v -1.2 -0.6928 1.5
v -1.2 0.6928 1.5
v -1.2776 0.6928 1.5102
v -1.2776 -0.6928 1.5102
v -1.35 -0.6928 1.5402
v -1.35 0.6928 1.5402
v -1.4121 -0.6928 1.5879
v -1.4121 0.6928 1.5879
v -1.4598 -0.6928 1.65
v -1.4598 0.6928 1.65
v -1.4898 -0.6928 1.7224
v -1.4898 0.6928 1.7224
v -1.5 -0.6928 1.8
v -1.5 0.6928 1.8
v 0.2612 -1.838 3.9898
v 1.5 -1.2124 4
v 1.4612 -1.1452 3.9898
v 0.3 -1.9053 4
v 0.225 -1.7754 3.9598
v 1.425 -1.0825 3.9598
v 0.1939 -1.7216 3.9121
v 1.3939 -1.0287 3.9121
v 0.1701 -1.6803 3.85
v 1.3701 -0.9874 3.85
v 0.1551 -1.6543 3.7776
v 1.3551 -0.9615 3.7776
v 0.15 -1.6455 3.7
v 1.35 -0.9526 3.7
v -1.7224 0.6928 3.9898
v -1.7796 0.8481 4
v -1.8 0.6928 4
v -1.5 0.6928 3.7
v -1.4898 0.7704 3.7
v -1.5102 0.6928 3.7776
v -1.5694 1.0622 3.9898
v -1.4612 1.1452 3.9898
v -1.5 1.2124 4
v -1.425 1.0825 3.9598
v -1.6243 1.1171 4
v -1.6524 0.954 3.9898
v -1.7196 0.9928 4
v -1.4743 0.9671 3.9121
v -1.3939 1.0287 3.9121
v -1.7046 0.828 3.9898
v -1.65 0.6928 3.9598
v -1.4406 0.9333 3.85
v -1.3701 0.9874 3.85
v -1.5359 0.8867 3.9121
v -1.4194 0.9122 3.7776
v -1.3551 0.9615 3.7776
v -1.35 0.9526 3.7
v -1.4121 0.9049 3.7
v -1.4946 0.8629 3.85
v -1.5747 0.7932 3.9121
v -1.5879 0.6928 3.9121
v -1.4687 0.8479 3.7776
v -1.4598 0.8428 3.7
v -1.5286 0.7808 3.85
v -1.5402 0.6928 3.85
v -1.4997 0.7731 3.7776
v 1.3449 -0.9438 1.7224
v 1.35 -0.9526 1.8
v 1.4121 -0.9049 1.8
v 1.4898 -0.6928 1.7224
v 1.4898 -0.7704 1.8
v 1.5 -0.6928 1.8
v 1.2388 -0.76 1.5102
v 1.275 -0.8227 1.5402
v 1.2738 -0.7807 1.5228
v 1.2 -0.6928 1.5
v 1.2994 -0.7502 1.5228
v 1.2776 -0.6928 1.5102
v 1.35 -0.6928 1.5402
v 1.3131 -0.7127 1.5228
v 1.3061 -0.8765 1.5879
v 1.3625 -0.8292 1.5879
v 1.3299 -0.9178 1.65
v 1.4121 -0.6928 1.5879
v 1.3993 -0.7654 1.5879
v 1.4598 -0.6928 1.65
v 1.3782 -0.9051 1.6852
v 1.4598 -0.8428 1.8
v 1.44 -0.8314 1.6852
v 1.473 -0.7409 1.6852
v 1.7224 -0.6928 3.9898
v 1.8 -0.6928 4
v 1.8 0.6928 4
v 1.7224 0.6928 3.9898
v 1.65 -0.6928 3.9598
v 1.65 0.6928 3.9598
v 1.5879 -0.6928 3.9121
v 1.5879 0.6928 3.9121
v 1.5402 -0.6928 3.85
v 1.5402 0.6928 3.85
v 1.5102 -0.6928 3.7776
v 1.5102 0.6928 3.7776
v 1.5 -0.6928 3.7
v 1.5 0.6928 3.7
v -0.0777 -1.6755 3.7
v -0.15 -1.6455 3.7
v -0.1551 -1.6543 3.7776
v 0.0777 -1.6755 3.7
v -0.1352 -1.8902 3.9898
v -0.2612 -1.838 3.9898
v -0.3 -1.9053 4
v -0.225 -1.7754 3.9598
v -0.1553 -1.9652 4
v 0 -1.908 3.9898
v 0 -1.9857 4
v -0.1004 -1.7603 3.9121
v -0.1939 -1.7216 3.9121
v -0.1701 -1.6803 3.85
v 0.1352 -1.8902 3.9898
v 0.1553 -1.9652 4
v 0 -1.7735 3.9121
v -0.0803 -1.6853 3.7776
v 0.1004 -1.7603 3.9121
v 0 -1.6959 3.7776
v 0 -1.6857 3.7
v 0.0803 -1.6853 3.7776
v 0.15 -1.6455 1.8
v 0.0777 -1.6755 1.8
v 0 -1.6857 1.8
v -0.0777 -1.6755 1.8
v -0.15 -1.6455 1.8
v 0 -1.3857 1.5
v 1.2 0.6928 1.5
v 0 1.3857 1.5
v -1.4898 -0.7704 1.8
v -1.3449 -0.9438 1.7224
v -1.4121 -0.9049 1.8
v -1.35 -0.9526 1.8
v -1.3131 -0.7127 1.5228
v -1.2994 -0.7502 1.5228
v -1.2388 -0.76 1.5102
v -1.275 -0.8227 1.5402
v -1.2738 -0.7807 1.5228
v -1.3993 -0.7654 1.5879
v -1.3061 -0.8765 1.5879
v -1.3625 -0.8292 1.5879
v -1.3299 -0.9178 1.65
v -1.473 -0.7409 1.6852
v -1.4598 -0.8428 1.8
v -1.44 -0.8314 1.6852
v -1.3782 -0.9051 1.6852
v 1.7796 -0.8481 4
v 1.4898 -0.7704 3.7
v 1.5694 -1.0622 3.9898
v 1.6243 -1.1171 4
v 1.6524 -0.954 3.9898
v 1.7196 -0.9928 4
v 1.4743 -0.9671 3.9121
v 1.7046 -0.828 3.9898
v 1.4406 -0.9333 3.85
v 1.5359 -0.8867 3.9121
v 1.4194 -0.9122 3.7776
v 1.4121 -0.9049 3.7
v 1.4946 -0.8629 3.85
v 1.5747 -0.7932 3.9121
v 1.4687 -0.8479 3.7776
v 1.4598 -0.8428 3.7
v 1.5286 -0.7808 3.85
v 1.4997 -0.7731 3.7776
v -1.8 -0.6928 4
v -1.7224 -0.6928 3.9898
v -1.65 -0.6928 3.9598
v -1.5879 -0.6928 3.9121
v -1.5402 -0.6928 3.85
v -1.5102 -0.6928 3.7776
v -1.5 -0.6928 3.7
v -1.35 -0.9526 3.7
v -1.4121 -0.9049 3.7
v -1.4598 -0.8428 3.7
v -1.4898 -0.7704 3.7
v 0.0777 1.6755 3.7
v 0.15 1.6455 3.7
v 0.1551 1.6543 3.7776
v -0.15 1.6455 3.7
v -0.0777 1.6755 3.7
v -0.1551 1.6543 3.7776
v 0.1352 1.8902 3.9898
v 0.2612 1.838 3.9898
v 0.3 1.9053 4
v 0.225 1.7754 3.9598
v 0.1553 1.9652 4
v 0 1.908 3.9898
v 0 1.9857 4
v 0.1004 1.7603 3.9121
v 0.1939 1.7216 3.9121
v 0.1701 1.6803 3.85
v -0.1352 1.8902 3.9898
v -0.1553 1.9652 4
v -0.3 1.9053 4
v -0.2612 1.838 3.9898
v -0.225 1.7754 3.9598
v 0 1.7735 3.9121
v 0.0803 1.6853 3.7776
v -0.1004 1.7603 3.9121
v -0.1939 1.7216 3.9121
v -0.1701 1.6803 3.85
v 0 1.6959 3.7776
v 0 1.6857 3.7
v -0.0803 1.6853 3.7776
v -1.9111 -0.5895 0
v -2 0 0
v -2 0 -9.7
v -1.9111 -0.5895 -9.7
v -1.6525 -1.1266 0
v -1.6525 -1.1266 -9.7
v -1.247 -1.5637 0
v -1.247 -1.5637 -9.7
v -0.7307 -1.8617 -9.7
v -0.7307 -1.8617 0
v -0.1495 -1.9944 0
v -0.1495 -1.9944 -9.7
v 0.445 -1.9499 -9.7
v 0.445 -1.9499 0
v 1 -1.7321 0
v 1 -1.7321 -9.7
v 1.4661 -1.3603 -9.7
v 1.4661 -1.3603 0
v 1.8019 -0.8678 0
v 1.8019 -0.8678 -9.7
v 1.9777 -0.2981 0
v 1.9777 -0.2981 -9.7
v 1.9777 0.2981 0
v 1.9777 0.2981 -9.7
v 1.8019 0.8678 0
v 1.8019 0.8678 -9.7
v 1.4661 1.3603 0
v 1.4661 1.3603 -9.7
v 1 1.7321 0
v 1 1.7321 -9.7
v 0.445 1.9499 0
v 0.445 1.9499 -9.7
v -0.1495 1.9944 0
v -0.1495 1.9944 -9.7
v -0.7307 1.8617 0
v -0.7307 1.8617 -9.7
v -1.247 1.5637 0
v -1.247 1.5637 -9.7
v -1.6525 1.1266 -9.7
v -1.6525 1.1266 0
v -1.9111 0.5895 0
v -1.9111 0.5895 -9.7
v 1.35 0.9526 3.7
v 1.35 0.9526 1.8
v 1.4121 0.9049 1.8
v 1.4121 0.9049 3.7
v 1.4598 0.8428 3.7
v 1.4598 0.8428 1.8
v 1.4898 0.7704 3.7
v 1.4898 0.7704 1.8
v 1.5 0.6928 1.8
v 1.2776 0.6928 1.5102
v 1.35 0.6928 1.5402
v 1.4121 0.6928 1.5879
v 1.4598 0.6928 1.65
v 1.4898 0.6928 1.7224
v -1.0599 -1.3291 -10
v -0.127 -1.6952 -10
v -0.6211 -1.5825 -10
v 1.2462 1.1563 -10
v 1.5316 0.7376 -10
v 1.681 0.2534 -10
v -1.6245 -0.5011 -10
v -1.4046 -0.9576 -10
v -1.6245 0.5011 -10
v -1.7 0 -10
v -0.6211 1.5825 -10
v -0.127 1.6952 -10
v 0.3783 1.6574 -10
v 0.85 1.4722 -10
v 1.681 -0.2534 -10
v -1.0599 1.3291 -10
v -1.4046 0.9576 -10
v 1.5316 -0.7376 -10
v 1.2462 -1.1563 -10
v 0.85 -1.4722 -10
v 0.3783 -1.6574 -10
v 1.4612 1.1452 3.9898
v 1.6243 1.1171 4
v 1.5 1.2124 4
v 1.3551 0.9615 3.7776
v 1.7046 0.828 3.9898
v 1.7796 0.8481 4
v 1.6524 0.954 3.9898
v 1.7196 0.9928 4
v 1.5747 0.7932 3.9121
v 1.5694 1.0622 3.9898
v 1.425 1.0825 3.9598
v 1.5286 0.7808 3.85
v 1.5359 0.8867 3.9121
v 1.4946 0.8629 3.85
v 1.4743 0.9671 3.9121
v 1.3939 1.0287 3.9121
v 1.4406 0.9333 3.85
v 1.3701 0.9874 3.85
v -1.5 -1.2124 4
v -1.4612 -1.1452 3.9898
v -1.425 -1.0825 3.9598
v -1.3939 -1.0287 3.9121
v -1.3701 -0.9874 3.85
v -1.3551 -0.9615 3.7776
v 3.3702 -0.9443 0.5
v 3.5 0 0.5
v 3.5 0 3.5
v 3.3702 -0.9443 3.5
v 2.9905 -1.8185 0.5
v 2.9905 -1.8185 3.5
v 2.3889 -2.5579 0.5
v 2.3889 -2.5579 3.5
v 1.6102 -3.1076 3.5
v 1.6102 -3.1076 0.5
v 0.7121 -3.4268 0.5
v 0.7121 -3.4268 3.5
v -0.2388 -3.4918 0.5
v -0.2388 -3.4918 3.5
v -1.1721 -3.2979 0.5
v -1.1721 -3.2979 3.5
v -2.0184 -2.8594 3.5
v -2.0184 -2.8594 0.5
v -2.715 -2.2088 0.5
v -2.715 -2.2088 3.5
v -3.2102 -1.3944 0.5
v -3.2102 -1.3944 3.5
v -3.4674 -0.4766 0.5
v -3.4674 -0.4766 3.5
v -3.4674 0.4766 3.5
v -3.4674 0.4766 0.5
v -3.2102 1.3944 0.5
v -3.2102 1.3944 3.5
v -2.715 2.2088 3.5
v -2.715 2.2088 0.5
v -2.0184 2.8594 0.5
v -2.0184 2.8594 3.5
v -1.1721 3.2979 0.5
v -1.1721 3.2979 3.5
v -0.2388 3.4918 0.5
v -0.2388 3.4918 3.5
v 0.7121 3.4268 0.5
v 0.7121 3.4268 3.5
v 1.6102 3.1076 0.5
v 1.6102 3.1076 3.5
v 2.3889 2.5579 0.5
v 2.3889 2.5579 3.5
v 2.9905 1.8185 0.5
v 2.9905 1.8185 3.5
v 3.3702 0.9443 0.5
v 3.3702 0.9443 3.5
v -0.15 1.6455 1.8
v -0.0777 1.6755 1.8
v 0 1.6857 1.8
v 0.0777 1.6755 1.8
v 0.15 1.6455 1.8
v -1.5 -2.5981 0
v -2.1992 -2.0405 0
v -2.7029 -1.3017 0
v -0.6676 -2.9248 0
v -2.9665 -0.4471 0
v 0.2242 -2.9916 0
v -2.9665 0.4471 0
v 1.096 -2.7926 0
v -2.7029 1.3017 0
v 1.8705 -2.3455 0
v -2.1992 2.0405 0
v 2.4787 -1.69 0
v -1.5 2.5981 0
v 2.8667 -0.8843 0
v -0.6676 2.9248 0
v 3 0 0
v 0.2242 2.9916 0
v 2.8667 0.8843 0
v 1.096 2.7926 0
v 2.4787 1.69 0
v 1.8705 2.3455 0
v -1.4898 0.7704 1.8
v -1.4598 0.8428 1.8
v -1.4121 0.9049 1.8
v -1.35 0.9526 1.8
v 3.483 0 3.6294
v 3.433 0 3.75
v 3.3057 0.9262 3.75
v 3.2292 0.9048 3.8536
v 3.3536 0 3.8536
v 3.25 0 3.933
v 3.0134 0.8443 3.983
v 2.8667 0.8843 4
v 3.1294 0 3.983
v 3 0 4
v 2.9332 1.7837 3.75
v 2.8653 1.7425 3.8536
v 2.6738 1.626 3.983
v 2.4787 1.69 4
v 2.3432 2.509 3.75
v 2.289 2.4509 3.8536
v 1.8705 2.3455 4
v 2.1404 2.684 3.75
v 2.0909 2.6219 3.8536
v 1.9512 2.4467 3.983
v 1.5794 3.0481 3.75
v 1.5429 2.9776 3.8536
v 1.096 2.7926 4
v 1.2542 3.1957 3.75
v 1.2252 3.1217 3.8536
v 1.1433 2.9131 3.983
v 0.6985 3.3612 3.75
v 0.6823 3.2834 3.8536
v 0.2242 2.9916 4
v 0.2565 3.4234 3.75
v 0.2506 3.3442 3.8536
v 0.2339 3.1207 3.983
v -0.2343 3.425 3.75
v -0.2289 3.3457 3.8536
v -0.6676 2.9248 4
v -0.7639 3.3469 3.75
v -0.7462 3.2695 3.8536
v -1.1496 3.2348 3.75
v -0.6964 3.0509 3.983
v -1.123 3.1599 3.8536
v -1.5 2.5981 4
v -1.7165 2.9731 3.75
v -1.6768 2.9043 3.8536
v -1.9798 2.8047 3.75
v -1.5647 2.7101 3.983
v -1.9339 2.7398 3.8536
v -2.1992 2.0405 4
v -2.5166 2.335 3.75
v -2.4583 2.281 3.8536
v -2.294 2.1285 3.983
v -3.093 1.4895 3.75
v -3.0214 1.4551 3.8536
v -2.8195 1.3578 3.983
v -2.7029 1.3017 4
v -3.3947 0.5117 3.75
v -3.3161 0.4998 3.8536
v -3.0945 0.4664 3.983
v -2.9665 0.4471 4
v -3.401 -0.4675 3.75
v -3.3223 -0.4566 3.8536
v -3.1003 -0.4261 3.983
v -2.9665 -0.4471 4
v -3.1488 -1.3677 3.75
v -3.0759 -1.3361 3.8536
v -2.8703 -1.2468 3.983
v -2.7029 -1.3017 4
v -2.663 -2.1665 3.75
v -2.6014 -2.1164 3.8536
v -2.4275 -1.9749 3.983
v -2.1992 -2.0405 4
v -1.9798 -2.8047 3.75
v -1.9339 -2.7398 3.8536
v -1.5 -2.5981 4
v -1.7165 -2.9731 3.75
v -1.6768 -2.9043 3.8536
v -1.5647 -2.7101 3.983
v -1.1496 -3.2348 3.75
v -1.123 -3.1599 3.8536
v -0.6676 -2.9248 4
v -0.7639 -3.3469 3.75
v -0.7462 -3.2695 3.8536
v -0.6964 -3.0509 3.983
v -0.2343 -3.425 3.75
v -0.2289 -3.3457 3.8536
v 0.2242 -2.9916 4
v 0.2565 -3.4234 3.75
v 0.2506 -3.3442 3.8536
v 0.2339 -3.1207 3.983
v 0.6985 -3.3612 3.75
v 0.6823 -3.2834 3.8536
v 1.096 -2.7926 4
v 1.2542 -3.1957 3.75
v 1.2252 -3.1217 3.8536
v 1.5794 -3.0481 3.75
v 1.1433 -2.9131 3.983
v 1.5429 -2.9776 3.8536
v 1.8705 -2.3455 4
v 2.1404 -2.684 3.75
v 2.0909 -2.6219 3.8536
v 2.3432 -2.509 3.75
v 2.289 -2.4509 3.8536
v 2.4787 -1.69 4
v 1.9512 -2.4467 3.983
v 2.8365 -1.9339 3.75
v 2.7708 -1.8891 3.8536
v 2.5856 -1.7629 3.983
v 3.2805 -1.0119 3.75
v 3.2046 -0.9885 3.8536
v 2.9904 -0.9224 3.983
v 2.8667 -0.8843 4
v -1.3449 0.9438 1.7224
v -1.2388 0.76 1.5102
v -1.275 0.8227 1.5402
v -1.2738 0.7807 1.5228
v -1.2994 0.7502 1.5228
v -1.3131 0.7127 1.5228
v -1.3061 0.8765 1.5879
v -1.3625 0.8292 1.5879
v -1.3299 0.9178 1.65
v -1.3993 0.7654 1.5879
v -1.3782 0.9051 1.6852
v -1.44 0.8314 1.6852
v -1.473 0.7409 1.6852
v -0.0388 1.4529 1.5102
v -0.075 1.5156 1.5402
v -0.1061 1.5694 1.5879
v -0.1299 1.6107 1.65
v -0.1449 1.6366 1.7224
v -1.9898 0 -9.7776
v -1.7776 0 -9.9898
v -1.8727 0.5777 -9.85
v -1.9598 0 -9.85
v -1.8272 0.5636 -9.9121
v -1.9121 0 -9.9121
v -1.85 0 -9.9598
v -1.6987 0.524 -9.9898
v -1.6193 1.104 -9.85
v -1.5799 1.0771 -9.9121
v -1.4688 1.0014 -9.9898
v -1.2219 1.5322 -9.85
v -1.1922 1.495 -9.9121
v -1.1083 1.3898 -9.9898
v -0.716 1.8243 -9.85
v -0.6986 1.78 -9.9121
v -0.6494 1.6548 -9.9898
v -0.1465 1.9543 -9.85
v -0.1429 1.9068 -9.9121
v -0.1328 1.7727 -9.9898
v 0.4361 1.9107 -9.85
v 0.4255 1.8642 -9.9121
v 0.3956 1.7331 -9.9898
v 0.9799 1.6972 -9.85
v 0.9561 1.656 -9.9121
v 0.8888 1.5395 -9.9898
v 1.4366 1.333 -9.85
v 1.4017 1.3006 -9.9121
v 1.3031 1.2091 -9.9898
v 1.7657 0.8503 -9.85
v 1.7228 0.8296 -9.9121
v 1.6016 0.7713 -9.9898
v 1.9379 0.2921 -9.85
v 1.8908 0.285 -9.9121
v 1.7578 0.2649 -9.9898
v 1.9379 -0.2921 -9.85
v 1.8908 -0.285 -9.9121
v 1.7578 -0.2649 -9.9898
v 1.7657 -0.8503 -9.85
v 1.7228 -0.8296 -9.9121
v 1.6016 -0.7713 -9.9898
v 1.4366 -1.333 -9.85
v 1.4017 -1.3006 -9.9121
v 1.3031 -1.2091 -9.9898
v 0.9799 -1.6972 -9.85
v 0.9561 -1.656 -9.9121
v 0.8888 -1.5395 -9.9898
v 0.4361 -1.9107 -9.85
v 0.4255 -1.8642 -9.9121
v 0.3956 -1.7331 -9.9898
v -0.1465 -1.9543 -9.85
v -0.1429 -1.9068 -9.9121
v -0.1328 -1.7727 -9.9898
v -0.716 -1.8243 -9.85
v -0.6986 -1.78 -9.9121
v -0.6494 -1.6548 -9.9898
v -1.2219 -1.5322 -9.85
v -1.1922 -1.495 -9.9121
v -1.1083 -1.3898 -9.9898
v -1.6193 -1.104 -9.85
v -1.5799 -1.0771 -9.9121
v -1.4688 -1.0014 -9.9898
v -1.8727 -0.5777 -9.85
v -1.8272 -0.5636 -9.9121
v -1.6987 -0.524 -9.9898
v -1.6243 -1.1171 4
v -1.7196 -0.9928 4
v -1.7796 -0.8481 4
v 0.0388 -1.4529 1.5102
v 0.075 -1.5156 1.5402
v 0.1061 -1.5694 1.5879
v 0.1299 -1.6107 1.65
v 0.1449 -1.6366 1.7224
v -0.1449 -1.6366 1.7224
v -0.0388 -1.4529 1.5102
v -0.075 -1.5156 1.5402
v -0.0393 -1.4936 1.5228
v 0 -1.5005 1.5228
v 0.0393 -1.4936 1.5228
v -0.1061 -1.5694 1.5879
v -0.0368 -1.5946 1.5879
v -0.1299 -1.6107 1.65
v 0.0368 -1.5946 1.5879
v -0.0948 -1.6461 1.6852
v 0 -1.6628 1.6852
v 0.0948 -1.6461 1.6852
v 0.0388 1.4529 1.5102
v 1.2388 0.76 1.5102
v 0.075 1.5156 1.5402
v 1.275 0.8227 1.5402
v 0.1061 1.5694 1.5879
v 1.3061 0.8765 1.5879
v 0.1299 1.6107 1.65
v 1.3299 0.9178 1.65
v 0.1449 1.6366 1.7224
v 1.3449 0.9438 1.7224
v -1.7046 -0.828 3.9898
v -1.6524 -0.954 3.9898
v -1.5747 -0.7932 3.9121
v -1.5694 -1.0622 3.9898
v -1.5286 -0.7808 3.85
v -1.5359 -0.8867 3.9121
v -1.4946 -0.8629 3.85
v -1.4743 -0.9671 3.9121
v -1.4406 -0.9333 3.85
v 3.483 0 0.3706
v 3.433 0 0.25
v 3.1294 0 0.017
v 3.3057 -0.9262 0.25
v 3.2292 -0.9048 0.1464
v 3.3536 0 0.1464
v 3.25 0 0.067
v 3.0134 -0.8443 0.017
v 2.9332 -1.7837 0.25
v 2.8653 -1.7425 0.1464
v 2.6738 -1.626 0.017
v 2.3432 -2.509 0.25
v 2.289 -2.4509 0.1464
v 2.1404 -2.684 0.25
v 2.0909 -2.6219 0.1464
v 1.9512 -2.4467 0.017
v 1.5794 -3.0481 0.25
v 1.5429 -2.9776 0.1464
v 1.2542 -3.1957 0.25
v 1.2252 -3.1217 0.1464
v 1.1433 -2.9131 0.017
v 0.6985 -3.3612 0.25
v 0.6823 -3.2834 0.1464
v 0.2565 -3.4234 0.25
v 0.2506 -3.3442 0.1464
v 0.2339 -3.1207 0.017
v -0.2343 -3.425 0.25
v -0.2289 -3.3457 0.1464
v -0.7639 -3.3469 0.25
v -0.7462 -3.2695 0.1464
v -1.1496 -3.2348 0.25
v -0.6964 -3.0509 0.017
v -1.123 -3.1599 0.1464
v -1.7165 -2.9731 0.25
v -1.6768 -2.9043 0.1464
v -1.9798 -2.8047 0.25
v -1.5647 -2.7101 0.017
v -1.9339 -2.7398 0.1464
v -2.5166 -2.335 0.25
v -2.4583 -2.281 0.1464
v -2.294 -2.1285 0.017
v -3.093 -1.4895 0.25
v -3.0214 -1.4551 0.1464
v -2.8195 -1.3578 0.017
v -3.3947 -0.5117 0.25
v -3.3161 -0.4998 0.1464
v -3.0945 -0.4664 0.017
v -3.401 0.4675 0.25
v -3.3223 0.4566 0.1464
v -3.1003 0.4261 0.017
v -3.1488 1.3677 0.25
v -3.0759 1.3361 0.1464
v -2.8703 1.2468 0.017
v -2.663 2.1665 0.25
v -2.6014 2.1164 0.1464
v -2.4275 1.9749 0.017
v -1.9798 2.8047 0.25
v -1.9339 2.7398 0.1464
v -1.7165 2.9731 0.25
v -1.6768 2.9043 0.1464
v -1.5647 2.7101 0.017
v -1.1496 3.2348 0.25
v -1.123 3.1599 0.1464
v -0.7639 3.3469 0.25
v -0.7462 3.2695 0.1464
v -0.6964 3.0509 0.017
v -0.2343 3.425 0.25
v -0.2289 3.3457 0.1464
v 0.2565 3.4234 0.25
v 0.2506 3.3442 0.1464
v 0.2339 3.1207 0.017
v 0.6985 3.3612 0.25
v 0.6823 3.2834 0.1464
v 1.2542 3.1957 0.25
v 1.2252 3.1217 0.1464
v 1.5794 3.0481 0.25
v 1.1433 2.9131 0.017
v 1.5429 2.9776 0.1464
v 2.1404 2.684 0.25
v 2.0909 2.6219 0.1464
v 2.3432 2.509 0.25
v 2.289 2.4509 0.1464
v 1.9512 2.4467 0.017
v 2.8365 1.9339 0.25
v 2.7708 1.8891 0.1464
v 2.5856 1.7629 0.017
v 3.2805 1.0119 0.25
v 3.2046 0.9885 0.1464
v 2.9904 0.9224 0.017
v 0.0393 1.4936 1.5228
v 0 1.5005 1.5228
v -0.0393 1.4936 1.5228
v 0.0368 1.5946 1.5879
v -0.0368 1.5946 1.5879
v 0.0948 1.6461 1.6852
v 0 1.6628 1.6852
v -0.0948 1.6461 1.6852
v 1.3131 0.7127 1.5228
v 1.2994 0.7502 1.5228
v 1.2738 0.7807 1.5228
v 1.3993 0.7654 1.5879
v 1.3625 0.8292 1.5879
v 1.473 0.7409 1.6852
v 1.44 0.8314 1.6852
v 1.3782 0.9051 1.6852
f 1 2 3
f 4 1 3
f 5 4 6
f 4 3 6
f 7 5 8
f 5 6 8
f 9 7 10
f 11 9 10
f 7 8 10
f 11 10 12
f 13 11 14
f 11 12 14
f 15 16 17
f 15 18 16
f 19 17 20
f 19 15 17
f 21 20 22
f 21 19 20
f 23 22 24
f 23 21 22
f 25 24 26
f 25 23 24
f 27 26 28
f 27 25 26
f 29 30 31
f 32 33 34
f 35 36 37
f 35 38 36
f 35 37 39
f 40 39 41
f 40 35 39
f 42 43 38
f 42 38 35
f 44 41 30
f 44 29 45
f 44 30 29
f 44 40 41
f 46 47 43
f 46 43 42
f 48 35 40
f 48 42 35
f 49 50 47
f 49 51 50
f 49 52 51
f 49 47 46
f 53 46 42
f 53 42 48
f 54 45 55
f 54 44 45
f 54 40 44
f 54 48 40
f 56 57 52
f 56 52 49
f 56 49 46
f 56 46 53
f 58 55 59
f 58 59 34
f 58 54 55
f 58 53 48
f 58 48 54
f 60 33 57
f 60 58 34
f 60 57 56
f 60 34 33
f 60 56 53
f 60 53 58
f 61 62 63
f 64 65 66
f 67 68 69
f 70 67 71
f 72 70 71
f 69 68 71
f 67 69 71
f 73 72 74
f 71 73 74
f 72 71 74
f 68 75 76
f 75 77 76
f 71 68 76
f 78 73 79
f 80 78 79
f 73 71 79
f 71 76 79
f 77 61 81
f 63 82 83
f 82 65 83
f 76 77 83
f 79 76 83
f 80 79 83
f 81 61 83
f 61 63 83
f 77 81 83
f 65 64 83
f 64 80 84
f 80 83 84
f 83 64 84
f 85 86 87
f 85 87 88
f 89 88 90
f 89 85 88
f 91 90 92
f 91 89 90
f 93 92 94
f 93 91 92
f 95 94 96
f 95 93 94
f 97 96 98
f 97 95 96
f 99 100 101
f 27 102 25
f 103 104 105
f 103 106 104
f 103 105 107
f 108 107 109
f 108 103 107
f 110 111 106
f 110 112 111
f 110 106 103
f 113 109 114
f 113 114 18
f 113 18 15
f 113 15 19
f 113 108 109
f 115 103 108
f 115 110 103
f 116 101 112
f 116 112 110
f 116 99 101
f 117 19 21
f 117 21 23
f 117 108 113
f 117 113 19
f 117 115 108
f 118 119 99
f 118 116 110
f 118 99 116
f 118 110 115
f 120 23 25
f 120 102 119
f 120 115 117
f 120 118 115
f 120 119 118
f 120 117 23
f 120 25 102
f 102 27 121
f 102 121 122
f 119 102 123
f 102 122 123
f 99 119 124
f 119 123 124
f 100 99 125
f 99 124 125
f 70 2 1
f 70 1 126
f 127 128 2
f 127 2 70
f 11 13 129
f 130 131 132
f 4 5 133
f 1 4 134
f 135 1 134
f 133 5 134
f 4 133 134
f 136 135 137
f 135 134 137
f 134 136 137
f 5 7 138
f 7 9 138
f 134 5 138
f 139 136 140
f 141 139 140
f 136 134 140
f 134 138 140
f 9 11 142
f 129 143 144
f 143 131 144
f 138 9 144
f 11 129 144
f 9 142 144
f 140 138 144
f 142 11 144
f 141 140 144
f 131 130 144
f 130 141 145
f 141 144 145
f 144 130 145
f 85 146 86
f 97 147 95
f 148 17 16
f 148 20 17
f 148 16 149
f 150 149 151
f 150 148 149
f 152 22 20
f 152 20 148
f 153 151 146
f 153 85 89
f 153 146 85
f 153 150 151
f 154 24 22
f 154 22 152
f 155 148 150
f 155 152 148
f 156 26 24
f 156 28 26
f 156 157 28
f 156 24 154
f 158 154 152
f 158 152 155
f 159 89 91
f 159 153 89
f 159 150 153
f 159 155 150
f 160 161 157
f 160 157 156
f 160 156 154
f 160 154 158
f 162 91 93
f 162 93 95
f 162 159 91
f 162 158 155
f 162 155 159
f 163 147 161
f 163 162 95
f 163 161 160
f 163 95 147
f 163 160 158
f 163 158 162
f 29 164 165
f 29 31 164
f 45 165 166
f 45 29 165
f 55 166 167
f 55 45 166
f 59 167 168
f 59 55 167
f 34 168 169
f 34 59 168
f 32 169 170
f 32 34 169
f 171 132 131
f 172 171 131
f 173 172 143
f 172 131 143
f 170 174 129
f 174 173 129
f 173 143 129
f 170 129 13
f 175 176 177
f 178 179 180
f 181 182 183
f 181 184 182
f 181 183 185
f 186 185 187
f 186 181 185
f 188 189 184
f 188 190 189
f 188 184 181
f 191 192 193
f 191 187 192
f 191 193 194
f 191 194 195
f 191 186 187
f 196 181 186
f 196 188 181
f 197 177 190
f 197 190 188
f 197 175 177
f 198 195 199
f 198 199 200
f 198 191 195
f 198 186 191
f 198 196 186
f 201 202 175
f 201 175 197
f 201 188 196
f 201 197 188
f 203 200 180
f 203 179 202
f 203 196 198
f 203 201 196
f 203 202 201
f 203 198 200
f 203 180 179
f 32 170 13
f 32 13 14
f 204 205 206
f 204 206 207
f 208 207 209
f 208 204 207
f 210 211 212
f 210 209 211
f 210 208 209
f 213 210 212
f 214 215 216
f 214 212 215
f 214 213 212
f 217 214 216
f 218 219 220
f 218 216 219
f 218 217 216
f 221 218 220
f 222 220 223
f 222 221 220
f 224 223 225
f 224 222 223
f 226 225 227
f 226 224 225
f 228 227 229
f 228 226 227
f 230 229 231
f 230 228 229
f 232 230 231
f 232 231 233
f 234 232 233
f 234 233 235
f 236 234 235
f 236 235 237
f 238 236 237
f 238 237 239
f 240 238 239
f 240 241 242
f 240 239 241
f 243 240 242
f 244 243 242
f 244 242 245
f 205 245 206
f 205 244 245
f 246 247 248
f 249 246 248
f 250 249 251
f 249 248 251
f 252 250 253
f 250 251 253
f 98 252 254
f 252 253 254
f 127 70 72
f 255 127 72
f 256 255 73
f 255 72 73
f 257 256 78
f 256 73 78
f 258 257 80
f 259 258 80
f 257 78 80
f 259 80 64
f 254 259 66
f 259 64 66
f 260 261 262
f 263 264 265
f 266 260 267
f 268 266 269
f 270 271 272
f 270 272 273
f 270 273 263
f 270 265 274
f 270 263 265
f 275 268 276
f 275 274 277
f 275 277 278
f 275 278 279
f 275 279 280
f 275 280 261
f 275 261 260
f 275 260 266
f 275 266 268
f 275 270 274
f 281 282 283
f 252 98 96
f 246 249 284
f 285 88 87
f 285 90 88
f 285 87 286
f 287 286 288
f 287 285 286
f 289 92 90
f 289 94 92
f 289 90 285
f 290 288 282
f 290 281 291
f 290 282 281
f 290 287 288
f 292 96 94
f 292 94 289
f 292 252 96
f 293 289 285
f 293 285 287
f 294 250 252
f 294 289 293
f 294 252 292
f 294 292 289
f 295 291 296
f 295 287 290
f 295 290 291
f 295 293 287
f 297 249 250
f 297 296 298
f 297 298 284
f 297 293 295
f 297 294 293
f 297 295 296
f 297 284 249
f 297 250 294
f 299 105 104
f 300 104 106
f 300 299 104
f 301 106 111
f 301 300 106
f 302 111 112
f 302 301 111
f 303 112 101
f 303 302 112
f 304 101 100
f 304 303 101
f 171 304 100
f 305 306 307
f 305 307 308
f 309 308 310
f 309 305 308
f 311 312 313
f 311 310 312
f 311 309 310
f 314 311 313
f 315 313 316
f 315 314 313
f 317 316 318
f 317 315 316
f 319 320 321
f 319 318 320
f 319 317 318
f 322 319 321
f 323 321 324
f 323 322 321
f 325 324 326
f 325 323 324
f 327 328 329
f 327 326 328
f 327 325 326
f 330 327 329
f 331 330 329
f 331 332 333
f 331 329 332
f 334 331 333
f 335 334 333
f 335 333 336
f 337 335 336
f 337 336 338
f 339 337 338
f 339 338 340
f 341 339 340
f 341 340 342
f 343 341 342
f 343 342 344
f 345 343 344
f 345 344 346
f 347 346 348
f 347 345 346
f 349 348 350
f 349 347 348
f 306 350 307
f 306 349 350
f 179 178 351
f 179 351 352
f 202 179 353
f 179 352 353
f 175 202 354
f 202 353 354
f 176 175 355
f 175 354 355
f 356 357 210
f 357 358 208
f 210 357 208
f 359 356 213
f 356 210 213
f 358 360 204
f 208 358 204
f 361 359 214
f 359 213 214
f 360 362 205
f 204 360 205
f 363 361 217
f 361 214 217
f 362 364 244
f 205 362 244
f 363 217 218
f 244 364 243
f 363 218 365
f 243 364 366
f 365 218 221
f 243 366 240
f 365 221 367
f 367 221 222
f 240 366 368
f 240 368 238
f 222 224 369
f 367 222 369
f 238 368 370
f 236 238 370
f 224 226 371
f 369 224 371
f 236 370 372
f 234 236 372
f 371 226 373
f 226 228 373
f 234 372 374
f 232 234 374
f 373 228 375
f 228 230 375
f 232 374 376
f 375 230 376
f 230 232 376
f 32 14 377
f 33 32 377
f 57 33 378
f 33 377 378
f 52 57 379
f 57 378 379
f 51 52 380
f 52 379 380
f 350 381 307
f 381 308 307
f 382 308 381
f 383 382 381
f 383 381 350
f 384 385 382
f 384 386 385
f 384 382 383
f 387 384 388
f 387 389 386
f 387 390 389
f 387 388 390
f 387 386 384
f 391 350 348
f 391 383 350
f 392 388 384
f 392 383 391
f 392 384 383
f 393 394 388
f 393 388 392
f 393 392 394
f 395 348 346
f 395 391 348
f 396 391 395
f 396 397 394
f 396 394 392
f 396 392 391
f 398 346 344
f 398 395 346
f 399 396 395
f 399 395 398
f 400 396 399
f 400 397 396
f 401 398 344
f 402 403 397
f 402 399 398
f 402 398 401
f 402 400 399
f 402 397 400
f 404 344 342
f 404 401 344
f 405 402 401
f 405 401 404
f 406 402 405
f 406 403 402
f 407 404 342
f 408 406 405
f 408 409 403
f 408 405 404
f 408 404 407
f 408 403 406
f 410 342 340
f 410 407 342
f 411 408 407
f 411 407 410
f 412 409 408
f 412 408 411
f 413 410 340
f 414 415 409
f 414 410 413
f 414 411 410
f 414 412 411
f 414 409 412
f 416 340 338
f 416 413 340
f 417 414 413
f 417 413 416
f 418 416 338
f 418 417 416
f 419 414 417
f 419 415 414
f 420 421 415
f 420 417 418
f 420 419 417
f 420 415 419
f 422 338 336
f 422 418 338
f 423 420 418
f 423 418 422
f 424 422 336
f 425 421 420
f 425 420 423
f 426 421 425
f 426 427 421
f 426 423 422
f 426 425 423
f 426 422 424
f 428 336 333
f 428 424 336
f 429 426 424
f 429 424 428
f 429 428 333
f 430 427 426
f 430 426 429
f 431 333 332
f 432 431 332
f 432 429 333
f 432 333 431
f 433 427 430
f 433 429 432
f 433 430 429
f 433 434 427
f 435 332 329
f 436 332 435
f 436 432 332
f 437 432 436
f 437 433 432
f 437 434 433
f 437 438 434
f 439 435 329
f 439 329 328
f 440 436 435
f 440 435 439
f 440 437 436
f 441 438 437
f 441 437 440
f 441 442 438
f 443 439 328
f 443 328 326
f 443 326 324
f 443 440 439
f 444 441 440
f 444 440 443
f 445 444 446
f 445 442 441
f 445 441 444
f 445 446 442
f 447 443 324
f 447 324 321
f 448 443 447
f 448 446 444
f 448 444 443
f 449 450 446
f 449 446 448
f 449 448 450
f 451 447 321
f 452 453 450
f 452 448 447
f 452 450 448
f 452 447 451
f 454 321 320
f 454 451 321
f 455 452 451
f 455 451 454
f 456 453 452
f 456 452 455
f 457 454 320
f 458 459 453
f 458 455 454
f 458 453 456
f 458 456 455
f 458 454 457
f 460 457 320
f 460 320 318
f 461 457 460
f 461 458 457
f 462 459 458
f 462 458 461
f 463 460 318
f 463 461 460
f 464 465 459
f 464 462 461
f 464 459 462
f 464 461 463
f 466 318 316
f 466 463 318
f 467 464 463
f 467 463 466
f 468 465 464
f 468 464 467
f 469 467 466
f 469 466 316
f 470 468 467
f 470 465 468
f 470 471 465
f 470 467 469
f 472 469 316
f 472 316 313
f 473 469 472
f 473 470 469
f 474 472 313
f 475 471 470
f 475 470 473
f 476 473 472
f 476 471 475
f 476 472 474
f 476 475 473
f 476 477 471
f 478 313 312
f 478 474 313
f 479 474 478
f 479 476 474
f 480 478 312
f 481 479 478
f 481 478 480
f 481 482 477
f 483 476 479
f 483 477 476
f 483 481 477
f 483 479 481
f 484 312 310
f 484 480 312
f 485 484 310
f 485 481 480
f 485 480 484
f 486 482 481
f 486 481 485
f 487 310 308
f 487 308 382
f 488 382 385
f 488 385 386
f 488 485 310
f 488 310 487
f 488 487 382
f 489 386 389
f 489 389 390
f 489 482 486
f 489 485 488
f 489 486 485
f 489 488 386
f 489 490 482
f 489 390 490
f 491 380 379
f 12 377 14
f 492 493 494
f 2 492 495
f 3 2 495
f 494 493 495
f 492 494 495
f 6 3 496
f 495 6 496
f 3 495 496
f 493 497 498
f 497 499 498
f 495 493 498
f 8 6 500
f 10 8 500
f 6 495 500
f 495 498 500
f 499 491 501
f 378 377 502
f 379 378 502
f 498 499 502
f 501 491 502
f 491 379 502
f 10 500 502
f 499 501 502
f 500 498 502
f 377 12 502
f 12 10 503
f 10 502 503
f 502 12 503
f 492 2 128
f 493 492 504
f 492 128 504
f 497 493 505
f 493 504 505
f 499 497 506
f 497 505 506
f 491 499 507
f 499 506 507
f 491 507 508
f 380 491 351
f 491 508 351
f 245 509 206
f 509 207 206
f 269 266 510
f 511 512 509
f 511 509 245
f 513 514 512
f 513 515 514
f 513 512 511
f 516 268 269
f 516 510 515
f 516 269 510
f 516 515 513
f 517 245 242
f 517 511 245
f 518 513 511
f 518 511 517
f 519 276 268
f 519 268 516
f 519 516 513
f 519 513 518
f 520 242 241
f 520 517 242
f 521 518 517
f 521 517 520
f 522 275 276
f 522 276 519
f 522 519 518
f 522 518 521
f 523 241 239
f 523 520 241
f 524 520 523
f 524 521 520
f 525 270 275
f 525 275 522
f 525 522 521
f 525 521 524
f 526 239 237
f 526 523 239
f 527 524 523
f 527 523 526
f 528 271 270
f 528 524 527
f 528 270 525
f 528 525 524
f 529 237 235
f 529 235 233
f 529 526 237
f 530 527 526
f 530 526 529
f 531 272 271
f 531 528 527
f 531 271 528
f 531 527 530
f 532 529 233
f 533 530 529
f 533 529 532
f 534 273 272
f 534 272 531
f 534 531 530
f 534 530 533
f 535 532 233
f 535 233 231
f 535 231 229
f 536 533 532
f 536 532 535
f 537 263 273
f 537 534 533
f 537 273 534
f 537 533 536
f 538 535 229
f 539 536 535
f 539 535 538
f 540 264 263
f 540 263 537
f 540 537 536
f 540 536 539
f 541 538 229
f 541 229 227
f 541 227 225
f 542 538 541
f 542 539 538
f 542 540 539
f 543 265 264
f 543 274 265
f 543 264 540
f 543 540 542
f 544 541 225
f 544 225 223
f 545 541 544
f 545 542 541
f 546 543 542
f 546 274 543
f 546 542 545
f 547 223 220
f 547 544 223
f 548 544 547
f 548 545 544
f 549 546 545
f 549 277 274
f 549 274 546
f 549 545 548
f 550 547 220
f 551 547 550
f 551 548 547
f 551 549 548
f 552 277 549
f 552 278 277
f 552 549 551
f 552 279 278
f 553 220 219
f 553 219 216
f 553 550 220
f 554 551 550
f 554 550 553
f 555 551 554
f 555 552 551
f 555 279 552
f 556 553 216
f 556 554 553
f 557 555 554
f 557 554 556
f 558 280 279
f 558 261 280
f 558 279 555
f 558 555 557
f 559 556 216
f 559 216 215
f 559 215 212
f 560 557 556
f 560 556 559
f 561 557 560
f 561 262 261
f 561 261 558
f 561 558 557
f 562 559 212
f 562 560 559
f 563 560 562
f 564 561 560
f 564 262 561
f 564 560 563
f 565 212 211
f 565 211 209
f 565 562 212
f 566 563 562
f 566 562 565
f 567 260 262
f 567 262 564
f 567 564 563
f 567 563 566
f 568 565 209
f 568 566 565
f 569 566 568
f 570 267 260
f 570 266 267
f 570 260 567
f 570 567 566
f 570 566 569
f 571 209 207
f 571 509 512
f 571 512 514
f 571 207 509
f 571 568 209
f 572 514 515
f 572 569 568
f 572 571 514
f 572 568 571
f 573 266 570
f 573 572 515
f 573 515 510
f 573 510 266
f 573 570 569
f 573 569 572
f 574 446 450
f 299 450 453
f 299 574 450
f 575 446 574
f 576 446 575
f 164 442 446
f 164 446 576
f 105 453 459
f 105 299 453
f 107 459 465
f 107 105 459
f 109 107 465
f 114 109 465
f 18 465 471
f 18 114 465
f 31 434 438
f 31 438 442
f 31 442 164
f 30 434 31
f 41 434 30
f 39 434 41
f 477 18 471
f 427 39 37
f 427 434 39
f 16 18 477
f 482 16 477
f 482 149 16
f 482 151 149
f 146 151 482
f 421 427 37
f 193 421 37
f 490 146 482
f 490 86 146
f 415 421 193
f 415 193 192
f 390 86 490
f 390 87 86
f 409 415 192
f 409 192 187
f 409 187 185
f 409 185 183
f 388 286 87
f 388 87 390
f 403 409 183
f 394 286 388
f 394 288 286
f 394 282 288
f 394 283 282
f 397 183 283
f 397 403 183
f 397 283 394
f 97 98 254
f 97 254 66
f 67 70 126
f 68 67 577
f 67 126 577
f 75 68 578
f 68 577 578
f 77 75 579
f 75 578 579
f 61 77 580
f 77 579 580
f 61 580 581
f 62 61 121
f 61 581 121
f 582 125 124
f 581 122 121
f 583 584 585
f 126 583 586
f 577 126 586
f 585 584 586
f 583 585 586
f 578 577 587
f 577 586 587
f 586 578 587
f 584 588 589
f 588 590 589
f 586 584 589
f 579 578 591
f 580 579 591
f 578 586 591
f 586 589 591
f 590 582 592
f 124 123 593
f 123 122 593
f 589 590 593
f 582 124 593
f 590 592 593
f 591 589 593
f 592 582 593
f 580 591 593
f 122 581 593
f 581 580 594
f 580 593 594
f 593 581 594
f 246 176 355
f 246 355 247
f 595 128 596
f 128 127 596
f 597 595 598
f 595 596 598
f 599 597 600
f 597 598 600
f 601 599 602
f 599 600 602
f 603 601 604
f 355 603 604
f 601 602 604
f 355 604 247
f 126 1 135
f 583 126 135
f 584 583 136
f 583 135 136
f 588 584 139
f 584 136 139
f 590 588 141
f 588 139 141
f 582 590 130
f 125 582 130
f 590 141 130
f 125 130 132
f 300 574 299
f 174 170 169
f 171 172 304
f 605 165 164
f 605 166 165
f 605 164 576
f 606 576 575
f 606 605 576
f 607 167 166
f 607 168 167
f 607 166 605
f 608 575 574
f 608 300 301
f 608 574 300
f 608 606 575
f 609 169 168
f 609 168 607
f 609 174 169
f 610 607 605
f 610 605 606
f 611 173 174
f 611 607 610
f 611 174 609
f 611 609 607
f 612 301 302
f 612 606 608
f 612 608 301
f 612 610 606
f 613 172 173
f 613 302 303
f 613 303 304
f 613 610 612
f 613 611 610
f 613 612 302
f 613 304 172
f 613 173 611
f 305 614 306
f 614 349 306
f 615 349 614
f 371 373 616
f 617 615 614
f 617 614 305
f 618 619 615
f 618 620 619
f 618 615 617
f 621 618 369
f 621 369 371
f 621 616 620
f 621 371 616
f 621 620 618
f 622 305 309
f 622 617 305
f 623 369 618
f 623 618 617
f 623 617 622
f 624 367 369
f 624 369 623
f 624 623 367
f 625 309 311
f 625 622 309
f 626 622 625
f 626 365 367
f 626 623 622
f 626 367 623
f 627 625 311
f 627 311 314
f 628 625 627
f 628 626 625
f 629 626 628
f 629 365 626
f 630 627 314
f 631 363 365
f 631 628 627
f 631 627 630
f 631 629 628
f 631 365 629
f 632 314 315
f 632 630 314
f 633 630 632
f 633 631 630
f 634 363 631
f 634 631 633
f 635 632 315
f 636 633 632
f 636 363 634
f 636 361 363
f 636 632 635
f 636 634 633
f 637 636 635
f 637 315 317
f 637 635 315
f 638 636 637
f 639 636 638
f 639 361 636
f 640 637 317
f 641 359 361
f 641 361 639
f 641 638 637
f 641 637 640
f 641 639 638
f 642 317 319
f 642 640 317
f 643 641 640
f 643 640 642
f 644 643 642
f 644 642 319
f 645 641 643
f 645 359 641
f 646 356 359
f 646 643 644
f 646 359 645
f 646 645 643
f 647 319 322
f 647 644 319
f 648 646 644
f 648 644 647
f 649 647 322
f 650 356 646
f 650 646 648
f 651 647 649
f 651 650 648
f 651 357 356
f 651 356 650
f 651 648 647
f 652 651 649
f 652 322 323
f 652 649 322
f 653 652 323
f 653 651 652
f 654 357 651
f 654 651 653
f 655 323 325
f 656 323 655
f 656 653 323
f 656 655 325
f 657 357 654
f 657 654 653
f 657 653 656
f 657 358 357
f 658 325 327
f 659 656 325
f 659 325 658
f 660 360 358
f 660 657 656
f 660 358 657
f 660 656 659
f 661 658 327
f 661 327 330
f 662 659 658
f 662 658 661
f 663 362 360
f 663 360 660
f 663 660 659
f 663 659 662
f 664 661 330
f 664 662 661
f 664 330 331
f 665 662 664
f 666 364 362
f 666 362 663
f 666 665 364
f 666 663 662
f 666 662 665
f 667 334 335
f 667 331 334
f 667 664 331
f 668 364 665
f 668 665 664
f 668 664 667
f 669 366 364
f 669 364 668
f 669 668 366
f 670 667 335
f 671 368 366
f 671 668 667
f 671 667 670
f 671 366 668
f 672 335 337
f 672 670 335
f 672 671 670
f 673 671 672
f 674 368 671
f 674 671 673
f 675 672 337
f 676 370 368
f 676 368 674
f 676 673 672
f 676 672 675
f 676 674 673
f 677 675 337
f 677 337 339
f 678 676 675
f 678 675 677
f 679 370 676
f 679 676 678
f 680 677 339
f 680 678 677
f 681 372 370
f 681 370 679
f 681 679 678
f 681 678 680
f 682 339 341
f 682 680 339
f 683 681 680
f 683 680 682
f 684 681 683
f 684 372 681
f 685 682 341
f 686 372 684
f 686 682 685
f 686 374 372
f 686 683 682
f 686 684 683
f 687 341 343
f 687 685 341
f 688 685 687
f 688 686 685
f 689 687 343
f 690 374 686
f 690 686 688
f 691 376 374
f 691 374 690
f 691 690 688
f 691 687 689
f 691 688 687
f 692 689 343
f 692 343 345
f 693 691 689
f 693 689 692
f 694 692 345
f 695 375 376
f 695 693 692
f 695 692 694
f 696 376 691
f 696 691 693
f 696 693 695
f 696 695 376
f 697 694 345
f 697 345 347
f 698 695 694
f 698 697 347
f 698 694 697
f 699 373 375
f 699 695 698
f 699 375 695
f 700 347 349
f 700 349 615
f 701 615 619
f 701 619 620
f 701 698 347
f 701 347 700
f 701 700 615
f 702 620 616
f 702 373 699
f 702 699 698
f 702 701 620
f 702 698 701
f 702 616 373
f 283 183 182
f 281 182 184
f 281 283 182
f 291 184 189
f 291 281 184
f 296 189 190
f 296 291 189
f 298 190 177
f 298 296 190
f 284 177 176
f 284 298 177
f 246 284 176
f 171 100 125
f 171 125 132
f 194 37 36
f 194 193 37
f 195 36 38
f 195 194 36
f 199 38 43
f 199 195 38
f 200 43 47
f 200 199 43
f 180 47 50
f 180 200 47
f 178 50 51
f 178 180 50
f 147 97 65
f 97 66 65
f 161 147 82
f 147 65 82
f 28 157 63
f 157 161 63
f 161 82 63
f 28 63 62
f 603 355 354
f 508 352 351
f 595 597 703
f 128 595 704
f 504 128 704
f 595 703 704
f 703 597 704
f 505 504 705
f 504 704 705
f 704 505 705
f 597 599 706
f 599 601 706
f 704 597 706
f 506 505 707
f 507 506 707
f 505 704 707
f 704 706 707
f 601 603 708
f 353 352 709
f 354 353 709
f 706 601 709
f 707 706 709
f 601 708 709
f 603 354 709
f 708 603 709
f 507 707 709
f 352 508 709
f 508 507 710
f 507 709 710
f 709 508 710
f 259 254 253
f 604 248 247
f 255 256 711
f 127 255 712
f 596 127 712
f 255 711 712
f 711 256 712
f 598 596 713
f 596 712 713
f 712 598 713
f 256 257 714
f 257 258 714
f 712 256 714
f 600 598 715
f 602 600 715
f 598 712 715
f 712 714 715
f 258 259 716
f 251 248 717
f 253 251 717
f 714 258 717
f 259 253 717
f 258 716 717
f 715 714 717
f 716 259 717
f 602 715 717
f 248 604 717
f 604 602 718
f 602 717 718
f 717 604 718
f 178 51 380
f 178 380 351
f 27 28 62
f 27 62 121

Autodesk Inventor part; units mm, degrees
ref_plane "YZ Plane" through (0, 0, 0) normal (1, 0, 0) x (0, 1, 0)
ref_plane "XZ Plane" through (0, 0, 0) normal (0, 1, 0) x (-1, 0, 0)
ref_plane "XY Plane" through (0, 0, 0) normal (0, 0, 1) x (1, 0, 0)
sketch "スケッチ1" plane through (0, 0, 0) normal (0, 0, 1) x (1, 0, 0)
  circle A0 centre (0, 0) radius 3.5
  dimension "d0" = 7
extrude "押し出し1" add sketch "スケッチ1" along normal blind 4
sketch "スケッチ2" plane through (0, 0, 0) normal (0, 0, -1) x (-1, 0, 0)
  circle A0 centre (0, 0) radius 3.5 projected
  circle A1 centre (0, 0) radius 2
  dimension "d3" = 4
extrude "押し出し2" add sketch "スケッチ2" along normal blind 10 contours A1
sketch "スケッチ3" plane through (0, 0, 4) normal (0, 0, 1) x (1, 0, 0)
  circle A0 centre (0, 0) radius 3.5 projected
  line L0 (0, 1.7321) -> (1.5, 0.866)
  line L1 (1.5, 0.866) -> (1.5, -0.866)
  line L2 (1.5, -0.866) -> (0, -1.7321)
  line L3 (0, -1.7321) -> (-1.5, -0.866)
  line L4 (-1.5, -0.866) -> (-1.5, 0.866)
  line L5 (-1.5, 0.866) -> (0, 1.7321)
  dimension "d6" = 1.5
extrude "押し出し3" cut sketch "スケッチ3" against normal blind 2.5 contours L0 L1 L2 L3 L4 L5
thread "ねじ1" size "M4x0.7" class "6g" standard "ANSI Metric M Profile" full length
fillet "フィレット1" radius 0.5 2 edges at (-3.5, 0, 4) (-3.5, 0, 0)
fillet "フィレット2" radius 0.3 19 edges at (-0.75, 1.299, 4) (-1.5, 0, 4) (-0.75, -1.299, 4) (0.75, -1.299, 4) (1.5, 0, 4) (0.75, 1.299, 4) (-0.75, 1.299, 1.5) (0.75, 1.299, 1.5) (0, 1.7321, 2.75) (-1.5, 0.866, 2.75) (-0.75, -1.299, 1.5) (-1.5, -0.866, 2.75) (-1.5, 0, 1.5) (1.5, 0, 1.5) (1.5, 0.866, 2.75) (1.5, -0.866, 2.75) (0.75, -1.299, 1.5) (0, -1.7321, 2.75) (2, 0, -10)
